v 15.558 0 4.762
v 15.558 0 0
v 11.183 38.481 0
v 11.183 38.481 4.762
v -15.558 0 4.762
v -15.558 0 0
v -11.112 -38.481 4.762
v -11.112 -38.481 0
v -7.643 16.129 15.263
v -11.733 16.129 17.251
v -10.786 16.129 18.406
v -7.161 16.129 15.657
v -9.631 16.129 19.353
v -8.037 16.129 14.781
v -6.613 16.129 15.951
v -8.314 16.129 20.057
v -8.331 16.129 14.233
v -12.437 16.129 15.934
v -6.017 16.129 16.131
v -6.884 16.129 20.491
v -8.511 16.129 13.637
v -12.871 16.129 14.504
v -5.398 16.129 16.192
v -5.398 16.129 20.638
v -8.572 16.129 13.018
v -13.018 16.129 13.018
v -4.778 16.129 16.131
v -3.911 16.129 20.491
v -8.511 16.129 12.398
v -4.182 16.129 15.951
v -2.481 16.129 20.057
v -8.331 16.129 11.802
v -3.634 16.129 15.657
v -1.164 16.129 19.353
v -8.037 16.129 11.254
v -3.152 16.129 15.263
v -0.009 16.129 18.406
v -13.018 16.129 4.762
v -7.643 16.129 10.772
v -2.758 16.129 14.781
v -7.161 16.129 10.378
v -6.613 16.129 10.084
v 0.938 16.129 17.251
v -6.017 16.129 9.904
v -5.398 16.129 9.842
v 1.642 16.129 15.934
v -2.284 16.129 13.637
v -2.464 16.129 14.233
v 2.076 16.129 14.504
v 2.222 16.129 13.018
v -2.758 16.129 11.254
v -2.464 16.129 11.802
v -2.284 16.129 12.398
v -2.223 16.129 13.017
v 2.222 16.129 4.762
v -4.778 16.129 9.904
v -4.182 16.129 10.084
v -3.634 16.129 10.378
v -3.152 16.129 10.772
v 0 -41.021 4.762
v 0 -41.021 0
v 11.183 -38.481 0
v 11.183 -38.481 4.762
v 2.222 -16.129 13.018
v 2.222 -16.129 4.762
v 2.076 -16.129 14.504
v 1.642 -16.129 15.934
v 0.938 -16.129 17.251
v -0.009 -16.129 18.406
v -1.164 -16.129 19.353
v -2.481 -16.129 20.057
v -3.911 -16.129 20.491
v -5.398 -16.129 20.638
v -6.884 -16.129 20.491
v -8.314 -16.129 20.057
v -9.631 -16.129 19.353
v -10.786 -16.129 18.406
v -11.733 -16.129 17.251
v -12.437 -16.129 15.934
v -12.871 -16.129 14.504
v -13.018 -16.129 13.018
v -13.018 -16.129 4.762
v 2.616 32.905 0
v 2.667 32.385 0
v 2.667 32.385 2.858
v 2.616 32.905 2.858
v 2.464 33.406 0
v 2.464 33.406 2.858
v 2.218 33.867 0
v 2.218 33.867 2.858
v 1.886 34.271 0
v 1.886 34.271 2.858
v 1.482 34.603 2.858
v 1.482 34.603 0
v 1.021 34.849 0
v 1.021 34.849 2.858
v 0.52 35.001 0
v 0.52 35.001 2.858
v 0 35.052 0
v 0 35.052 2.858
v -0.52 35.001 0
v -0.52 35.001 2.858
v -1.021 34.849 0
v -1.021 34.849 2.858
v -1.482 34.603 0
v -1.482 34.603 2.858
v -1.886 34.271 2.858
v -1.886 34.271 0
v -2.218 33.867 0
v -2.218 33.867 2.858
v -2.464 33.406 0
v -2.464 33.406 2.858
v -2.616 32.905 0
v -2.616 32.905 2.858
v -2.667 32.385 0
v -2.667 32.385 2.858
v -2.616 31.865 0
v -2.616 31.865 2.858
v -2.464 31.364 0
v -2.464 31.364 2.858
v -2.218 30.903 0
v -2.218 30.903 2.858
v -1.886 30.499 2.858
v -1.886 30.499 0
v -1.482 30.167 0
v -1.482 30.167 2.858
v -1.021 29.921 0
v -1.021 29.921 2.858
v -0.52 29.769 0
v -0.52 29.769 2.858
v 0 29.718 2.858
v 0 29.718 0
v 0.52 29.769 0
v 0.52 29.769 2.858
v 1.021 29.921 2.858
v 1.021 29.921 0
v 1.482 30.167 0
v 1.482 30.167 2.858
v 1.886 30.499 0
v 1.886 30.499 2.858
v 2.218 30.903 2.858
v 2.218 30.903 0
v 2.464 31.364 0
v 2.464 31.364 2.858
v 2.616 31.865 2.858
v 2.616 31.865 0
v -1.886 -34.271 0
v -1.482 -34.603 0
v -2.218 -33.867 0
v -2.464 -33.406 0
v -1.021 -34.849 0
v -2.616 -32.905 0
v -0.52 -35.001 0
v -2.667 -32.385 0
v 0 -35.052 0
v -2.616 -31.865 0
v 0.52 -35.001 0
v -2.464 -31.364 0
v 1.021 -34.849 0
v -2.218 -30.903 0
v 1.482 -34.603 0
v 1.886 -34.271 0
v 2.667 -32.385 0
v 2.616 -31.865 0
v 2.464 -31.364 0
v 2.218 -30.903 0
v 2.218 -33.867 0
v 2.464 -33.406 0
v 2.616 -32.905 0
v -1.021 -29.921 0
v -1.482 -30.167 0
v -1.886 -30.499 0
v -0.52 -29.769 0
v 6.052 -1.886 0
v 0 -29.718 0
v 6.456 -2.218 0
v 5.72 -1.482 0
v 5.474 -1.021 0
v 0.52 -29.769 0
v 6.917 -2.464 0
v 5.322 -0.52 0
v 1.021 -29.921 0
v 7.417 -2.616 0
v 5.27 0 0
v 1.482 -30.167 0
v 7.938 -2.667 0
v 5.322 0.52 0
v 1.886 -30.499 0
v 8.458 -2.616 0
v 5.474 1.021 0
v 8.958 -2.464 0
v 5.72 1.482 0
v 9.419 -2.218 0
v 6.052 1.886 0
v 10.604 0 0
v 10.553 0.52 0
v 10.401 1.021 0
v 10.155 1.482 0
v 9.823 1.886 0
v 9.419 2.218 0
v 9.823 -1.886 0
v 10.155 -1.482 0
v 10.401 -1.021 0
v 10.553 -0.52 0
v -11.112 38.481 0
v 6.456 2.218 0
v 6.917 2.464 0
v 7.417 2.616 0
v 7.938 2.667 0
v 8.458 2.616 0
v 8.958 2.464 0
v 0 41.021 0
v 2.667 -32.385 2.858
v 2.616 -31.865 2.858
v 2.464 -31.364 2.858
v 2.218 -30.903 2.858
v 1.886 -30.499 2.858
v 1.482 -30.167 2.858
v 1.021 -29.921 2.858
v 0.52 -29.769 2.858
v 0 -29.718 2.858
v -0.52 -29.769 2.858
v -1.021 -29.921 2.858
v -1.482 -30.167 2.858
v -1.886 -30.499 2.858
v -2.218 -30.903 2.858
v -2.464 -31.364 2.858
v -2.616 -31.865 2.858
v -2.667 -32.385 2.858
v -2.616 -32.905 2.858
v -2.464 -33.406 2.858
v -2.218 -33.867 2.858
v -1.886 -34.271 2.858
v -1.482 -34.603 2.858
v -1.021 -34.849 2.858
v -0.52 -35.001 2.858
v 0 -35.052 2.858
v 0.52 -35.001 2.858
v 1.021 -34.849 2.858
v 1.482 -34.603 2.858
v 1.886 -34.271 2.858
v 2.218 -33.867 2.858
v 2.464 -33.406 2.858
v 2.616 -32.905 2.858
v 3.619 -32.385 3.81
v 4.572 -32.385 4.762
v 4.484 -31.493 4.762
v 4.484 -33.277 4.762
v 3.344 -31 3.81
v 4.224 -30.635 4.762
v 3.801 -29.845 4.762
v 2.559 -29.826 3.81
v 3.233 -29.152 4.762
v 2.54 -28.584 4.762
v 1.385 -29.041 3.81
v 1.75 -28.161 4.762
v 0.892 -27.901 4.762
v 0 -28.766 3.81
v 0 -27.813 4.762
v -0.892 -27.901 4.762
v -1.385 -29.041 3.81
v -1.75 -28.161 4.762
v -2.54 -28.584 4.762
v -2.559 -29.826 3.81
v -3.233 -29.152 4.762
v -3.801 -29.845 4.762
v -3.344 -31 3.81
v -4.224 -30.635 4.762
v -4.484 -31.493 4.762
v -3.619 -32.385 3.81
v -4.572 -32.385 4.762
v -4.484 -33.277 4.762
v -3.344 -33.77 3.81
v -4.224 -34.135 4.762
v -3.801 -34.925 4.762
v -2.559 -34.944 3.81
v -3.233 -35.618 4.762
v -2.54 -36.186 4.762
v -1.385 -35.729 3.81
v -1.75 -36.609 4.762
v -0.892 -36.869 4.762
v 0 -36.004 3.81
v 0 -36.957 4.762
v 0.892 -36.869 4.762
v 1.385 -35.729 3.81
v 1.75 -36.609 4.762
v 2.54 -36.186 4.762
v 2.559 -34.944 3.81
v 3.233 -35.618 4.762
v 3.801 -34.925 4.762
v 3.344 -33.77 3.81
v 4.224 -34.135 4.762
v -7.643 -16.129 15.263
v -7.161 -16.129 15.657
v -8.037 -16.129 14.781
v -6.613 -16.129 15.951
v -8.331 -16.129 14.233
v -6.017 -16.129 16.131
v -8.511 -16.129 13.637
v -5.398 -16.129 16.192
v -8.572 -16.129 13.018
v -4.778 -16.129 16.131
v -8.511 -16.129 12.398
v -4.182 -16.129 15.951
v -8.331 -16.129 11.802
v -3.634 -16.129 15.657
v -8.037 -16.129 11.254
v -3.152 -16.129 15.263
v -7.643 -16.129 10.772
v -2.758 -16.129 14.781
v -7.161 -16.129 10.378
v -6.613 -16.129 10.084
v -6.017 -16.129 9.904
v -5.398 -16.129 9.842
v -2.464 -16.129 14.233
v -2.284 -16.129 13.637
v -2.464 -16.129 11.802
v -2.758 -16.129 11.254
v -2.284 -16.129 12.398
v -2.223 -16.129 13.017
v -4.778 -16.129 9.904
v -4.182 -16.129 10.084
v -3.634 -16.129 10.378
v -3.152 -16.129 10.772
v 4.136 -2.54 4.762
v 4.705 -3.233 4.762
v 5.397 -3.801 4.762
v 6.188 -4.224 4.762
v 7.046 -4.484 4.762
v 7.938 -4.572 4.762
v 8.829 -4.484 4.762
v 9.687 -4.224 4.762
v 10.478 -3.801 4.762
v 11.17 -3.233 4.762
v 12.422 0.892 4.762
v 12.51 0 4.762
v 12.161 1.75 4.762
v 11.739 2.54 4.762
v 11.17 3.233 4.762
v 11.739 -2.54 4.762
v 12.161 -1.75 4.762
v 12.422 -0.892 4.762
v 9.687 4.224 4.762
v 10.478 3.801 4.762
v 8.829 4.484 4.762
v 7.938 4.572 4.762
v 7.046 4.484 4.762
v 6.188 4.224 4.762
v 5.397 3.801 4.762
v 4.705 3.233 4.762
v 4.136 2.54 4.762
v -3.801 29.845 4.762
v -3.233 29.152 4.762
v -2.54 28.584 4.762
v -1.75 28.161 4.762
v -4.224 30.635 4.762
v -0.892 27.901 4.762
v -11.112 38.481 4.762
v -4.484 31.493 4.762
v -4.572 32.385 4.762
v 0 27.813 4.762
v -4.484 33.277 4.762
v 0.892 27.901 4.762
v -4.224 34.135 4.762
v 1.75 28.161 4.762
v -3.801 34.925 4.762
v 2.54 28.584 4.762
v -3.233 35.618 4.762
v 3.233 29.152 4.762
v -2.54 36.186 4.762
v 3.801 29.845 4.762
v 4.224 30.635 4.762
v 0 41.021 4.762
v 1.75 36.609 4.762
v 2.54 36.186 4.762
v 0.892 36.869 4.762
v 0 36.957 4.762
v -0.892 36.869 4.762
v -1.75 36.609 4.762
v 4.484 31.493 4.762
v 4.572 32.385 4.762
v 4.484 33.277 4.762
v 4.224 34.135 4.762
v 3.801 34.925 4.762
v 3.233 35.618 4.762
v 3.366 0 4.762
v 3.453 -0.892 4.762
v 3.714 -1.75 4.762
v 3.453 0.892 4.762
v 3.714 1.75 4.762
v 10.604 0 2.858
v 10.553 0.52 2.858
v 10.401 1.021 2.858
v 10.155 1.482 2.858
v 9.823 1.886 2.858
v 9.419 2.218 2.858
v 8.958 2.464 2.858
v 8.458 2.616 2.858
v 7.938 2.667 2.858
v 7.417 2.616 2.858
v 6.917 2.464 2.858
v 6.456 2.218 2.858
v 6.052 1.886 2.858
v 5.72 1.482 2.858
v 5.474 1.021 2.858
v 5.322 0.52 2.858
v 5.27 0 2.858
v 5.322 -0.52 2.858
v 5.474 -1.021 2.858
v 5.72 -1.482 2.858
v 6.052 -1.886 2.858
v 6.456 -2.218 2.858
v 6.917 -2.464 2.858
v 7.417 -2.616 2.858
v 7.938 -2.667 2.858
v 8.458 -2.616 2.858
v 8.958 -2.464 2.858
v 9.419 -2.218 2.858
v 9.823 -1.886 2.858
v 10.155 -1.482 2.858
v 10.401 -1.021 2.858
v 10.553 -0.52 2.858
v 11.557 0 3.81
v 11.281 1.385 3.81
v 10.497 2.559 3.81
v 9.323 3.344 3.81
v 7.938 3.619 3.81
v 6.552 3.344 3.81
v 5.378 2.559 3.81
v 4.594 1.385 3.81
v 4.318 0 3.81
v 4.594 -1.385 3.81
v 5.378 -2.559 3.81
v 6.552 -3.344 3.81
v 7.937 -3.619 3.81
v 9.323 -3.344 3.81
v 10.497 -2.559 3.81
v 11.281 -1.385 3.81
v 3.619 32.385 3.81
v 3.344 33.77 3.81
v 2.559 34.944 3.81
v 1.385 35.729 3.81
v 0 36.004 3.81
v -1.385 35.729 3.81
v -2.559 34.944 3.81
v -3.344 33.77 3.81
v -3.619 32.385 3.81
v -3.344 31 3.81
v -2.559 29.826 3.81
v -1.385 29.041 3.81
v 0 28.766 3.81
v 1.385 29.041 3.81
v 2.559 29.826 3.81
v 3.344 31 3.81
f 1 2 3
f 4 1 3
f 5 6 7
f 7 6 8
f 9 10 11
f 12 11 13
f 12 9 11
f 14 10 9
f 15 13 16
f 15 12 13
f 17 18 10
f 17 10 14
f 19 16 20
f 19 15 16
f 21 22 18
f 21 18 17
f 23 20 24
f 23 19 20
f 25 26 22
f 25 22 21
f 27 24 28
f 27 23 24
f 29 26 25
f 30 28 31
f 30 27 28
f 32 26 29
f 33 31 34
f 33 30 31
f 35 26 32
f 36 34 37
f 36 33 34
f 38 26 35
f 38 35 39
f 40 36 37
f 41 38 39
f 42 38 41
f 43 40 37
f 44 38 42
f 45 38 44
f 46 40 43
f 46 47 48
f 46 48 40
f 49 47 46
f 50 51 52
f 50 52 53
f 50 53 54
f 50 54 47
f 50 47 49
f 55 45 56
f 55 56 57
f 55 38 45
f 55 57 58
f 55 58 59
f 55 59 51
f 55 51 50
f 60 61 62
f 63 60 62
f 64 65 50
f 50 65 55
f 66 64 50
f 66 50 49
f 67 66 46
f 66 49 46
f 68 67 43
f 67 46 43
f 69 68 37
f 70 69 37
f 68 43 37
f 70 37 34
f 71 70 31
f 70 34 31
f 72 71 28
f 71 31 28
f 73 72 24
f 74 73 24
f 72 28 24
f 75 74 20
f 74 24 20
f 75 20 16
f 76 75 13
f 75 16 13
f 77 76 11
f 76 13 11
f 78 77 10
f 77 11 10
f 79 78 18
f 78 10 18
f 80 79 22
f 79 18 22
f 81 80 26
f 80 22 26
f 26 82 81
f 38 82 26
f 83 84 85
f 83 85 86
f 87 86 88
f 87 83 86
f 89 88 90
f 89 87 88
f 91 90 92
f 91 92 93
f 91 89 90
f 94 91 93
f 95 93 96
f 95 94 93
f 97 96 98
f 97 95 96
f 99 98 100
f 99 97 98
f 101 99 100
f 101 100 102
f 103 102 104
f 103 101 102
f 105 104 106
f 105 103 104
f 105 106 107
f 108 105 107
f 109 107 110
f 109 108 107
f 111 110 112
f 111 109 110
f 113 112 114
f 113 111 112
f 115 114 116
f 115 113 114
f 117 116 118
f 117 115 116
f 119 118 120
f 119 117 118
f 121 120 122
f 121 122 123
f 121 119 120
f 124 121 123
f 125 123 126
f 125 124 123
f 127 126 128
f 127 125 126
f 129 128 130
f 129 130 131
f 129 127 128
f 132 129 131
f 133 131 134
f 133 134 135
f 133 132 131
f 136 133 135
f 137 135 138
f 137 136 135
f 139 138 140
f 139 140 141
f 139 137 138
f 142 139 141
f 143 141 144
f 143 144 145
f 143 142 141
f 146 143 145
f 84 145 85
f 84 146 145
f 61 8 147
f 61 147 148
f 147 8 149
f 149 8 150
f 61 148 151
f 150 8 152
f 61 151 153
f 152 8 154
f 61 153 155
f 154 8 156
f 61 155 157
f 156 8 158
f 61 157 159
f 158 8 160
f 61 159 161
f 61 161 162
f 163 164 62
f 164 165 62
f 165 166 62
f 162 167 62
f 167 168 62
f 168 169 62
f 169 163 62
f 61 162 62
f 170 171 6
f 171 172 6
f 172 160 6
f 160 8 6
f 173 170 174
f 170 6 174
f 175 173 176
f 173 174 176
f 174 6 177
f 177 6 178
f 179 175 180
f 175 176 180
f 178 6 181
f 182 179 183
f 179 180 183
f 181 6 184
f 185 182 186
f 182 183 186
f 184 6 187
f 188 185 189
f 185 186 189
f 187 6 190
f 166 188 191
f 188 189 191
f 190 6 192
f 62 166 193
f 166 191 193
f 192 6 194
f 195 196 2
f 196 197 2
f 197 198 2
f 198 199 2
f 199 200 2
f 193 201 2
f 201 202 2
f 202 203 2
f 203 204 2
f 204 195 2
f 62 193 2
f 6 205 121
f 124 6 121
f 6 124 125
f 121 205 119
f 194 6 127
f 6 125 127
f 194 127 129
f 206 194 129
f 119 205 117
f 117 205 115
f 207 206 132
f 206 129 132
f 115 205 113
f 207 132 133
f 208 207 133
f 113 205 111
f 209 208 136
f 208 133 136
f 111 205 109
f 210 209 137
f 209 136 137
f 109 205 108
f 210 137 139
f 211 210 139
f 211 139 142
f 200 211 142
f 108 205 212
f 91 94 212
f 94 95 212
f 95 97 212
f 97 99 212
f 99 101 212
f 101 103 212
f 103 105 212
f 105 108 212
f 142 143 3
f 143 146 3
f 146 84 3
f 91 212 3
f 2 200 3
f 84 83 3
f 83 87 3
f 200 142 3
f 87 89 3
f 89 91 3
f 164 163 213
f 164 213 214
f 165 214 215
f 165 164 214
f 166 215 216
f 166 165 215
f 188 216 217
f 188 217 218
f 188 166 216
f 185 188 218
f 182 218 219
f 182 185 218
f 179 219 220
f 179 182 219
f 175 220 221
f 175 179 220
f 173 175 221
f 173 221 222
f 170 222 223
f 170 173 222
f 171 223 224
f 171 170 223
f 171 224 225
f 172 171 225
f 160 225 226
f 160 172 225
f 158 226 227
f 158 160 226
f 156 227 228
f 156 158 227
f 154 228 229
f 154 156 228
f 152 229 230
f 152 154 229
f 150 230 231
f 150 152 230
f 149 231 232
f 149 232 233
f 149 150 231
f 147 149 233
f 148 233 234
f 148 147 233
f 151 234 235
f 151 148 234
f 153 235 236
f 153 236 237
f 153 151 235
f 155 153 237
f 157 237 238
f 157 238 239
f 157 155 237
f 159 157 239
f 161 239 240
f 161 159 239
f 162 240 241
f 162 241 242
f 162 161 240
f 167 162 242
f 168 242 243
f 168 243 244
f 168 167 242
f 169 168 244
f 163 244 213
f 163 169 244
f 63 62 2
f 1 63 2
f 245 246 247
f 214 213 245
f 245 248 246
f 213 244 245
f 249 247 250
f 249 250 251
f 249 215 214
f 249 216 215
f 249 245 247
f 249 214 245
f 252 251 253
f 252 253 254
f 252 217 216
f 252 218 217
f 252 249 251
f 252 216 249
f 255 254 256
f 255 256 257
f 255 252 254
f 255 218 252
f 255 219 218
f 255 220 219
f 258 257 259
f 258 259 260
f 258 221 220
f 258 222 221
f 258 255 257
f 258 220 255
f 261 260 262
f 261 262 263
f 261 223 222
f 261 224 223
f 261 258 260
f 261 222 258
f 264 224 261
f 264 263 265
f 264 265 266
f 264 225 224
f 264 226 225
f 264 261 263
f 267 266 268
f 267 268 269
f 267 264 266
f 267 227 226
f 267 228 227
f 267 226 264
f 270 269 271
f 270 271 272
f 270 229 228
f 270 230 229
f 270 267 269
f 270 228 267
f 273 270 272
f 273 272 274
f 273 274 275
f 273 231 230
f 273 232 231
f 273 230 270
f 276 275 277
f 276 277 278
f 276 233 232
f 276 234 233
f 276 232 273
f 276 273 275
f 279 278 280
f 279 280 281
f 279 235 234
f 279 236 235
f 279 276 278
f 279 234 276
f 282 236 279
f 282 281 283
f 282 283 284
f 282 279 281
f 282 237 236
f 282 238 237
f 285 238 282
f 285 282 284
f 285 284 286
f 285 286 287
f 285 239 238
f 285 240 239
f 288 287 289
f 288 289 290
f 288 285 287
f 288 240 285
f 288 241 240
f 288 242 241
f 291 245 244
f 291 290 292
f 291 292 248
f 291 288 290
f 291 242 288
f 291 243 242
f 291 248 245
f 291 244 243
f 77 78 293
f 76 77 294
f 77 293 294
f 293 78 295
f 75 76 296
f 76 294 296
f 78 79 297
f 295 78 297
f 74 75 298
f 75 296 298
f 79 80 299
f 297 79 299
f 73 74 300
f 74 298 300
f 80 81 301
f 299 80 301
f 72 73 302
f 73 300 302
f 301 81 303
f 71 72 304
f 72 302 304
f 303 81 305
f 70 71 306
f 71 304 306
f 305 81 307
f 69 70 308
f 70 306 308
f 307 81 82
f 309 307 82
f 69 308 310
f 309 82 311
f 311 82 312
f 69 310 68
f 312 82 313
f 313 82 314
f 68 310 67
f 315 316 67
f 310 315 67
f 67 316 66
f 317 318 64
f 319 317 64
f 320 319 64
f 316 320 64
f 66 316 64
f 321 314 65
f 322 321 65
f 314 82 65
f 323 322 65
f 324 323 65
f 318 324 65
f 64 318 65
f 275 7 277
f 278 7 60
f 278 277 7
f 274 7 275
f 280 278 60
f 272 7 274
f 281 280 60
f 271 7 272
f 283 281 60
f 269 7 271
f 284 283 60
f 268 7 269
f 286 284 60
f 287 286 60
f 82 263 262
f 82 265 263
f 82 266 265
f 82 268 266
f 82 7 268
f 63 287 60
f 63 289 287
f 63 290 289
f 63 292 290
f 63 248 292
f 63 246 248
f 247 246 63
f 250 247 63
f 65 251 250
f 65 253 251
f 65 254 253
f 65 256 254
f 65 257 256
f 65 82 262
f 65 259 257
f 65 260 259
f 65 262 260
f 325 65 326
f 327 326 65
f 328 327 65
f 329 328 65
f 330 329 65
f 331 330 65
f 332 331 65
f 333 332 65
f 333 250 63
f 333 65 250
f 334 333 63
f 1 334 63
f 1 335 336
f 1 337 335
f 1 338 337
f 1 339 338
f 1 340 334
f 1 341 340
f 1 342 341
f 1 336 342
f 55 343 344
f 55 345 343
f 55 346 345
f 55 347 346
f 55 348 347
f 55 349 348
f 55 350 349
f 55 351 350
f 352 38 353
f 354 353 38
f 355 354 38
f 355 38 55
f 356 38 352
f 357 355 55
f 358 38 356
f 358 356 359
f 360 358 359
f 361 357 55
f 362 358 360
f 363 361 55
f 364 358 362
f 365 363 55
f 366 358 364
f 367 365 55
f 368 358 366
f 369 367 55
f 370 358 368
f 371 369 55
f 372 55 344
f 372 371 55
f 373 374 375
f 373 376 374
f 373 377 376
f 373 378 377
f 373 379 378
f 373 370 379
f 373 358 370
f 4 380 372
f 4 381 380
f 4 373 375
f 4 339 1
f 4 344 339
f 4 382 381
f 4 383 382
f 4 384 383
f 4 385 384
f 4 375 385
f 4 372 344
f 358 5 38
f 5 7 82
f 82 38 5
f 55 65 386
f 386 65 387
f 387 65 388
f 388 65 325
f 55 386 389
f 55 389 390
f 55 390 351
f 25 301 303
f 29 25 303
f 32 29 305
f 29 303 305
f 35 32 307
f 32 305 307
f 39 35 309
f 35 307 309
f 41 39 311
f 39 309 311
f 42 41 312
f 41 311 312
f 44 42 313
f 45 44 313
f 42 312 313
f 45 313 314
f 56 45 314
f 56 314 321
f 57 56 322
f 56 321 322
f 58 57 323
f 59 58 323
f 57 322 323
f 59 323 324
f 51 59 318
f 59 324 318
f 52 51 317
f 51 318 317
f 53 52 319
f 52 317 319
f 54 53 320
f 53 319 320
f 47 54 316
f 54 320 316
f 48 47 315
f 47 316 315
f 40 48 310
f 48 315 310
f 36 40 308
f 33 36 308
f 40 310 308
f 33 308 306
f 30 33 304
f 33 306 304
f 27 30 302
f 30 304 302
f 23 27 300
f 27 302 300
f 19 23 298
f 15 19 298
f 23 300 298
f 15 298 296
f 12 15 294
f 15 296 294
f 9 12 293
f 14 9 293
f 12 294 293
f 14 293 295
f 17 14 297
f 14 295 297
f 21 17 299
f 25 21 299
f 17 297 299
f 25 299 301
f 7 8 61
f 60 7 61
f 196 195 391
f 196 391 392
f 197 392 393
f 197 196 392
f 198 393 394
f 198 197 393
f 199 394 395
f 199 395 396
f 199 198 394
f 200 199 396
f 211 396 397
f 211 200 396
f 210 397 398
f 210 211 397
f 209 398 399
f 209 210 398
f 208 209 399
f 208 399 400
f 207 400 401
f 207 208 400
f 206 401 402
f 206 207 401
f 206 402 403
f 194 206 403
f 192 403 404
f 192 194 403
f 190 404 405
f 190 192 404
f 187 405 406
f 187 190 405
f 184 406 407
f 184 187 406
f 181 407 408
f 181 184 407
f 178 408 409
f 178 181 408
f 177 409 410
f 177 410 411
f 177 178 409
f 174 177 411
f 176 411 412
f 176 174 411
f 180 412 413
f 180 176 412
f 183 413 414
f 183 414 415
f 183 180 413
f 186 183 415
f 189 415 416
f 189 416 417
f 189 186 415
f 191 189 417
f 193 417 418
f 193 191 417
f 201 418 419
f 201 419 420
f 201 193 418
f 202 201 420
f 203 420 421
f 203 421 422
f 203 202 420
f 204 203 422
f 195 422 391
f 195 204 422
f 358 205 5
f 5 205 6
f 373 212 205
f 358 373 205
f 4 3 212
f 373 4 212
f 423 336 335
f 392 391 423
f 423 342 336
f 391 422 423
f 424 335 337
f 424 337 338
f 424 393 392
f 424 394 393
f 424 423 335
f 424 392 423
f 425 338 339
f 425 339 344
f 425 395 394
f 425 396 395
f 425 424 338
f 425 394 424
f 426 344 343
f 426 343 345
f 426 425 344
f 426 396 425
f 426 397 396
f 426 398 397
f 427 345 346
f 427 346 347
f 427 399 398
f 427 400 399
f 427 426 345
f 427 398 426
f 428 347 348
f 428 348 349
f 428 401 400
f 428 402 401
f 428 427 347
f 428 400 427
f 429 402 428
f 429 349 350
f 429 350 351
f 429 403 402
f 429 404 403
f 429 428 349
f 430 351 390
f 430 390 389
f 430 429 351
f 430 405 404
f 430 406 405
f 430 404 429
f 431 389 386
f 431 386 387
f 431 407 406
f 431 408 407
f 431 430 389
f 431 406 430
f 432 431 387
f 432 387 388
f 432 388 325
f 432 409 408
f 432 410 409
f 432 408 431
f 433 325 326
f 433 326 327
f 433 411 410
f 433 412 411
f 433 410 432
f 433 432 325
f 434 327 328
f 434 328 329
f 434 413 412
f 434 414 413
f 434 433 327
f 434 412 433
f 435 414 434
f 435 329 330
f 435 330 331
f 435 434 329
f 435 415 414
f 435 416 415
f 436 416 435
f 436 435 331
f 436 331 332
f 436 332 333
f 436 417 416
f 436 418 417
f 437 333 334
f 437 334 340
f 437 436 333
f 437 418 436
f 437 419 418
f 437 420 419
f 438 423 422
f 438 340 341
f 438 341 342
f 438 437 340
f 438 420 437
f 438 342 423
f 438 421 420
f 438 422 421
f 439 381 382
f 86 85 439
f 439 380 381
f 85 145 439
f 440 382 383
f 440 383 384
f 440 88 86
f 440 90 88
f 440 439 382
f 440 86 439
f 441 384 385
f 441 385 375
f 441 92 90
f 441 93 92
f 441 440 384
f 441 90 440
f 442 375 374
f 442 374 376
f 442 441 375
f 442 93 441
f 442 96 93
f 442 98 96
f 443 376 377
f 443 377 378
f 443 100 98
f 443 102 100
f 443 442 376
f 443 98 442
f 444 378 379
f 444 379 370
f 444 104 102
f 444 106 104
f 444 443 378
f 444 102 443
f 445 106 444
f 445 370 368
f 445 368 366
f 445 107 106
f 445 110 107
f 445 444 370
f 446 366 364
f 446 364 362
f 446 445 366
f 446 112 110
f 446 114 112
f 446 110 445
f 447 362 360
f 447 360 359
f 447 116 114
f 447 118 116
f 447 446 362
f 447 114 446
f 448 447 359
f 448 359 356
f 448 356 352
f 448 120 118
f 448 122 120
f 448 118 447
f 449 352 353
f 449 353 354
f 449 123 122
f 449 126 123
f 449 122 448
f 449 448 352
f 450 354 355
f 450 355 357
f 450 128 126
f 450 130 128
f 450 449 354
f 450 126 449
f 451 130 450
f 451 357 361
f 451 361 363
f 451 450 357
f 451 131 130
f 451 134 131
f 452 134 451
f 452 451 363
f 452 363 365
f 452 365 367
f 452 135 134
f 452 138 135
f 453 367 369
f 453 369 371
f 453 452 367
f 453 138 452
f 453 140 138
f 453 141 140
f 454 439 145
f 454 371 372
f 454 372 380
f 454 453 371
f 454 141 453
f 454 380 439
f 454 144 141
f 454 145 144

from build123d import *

# Parameters (mm, degrees)
F0_R     = 2.667
F0_W     = 15.24
F0_H     = 32.258
F1_DEPTH = 4.7625
F2_DEPTH = 13.0175
F3_W     = 7.62
F3_H     = 32.258
F6_DEPTH = 32.258
F7_SIZE  = 1.905


with BuildPart() as f1:
    # F0 (on Top) → F1 (new body)
    with BuildSketch(Plane.XY):
        Polygon((-11.1125, -38.481), (0, -41.021), (11.1834268409, -38.481), (15.5575, 0), (11.1834268409, 38.481), (0, 41.021), (-11.1125, 38.481), (-15.5575, 0), align=None)
        with Locations((0, -32.385)):
            Circle(F0_R, mode=Mode.SUBTRACT)
        with Locations((-5.3975, 0)):
            Rectangle(F0_W, F0_H, mode=Mode.SUBTRACT)
        with Locations((0, 32.385)):
            Circle(F0_R, mode=Mode.SUBTRACT)
        with Locations((7.9375, 0)):
            Circle(F0_R, mode=Mode.SUBTRACT)
    extrude(amount=F1_DEPTH)

    # F0 (on Top) → F2 (join)
    with BuildSketch(Plane.XY):
        with Locations((-5.3975, 0)):
            Rectangle(F0_W, F0_H)
    extrude(amount=F2_DEPTH)

    # F3 (on face) → F4 (revolve)
    with BuildSketch(Plane.XY.offset(13.0175)):
        with Locations((-9.2075, 0)):
            Rectangle(F3_W, F3_H)
    revolve(axis=Axis((-5.3975, 0, 13.0175), (0, -1, 0)))

    # F5 (on face) → F6 (cut)
    with BuildSketch(Plane.XZ.offset(16.129)):
        with BuildLine():
            ThreePointArc((-2.2225, 13.0175), (-5.3975, 16.1925), (-8.5725, 13.0175))
            ThreePointArc((-8.5725, 13.0175), (-5.3975, 9.8425), (-2.2225, 13.0175))
        make_face()
    extrude(amount=-F6_DEPTH, mode=Mode.SUBTRACT)

    # F7
    f7_edges = [f1.edges().sort_by_distance(p)[0] for p in [
        (-2.667, -32.385, 4.7625),
        (5.2705, 0, 4.7625),
        (-2.667, 32.385, 4.7625),
    ]]
    chamfer(f7_edges, length=F7_SIZE)


solid = f1.part
